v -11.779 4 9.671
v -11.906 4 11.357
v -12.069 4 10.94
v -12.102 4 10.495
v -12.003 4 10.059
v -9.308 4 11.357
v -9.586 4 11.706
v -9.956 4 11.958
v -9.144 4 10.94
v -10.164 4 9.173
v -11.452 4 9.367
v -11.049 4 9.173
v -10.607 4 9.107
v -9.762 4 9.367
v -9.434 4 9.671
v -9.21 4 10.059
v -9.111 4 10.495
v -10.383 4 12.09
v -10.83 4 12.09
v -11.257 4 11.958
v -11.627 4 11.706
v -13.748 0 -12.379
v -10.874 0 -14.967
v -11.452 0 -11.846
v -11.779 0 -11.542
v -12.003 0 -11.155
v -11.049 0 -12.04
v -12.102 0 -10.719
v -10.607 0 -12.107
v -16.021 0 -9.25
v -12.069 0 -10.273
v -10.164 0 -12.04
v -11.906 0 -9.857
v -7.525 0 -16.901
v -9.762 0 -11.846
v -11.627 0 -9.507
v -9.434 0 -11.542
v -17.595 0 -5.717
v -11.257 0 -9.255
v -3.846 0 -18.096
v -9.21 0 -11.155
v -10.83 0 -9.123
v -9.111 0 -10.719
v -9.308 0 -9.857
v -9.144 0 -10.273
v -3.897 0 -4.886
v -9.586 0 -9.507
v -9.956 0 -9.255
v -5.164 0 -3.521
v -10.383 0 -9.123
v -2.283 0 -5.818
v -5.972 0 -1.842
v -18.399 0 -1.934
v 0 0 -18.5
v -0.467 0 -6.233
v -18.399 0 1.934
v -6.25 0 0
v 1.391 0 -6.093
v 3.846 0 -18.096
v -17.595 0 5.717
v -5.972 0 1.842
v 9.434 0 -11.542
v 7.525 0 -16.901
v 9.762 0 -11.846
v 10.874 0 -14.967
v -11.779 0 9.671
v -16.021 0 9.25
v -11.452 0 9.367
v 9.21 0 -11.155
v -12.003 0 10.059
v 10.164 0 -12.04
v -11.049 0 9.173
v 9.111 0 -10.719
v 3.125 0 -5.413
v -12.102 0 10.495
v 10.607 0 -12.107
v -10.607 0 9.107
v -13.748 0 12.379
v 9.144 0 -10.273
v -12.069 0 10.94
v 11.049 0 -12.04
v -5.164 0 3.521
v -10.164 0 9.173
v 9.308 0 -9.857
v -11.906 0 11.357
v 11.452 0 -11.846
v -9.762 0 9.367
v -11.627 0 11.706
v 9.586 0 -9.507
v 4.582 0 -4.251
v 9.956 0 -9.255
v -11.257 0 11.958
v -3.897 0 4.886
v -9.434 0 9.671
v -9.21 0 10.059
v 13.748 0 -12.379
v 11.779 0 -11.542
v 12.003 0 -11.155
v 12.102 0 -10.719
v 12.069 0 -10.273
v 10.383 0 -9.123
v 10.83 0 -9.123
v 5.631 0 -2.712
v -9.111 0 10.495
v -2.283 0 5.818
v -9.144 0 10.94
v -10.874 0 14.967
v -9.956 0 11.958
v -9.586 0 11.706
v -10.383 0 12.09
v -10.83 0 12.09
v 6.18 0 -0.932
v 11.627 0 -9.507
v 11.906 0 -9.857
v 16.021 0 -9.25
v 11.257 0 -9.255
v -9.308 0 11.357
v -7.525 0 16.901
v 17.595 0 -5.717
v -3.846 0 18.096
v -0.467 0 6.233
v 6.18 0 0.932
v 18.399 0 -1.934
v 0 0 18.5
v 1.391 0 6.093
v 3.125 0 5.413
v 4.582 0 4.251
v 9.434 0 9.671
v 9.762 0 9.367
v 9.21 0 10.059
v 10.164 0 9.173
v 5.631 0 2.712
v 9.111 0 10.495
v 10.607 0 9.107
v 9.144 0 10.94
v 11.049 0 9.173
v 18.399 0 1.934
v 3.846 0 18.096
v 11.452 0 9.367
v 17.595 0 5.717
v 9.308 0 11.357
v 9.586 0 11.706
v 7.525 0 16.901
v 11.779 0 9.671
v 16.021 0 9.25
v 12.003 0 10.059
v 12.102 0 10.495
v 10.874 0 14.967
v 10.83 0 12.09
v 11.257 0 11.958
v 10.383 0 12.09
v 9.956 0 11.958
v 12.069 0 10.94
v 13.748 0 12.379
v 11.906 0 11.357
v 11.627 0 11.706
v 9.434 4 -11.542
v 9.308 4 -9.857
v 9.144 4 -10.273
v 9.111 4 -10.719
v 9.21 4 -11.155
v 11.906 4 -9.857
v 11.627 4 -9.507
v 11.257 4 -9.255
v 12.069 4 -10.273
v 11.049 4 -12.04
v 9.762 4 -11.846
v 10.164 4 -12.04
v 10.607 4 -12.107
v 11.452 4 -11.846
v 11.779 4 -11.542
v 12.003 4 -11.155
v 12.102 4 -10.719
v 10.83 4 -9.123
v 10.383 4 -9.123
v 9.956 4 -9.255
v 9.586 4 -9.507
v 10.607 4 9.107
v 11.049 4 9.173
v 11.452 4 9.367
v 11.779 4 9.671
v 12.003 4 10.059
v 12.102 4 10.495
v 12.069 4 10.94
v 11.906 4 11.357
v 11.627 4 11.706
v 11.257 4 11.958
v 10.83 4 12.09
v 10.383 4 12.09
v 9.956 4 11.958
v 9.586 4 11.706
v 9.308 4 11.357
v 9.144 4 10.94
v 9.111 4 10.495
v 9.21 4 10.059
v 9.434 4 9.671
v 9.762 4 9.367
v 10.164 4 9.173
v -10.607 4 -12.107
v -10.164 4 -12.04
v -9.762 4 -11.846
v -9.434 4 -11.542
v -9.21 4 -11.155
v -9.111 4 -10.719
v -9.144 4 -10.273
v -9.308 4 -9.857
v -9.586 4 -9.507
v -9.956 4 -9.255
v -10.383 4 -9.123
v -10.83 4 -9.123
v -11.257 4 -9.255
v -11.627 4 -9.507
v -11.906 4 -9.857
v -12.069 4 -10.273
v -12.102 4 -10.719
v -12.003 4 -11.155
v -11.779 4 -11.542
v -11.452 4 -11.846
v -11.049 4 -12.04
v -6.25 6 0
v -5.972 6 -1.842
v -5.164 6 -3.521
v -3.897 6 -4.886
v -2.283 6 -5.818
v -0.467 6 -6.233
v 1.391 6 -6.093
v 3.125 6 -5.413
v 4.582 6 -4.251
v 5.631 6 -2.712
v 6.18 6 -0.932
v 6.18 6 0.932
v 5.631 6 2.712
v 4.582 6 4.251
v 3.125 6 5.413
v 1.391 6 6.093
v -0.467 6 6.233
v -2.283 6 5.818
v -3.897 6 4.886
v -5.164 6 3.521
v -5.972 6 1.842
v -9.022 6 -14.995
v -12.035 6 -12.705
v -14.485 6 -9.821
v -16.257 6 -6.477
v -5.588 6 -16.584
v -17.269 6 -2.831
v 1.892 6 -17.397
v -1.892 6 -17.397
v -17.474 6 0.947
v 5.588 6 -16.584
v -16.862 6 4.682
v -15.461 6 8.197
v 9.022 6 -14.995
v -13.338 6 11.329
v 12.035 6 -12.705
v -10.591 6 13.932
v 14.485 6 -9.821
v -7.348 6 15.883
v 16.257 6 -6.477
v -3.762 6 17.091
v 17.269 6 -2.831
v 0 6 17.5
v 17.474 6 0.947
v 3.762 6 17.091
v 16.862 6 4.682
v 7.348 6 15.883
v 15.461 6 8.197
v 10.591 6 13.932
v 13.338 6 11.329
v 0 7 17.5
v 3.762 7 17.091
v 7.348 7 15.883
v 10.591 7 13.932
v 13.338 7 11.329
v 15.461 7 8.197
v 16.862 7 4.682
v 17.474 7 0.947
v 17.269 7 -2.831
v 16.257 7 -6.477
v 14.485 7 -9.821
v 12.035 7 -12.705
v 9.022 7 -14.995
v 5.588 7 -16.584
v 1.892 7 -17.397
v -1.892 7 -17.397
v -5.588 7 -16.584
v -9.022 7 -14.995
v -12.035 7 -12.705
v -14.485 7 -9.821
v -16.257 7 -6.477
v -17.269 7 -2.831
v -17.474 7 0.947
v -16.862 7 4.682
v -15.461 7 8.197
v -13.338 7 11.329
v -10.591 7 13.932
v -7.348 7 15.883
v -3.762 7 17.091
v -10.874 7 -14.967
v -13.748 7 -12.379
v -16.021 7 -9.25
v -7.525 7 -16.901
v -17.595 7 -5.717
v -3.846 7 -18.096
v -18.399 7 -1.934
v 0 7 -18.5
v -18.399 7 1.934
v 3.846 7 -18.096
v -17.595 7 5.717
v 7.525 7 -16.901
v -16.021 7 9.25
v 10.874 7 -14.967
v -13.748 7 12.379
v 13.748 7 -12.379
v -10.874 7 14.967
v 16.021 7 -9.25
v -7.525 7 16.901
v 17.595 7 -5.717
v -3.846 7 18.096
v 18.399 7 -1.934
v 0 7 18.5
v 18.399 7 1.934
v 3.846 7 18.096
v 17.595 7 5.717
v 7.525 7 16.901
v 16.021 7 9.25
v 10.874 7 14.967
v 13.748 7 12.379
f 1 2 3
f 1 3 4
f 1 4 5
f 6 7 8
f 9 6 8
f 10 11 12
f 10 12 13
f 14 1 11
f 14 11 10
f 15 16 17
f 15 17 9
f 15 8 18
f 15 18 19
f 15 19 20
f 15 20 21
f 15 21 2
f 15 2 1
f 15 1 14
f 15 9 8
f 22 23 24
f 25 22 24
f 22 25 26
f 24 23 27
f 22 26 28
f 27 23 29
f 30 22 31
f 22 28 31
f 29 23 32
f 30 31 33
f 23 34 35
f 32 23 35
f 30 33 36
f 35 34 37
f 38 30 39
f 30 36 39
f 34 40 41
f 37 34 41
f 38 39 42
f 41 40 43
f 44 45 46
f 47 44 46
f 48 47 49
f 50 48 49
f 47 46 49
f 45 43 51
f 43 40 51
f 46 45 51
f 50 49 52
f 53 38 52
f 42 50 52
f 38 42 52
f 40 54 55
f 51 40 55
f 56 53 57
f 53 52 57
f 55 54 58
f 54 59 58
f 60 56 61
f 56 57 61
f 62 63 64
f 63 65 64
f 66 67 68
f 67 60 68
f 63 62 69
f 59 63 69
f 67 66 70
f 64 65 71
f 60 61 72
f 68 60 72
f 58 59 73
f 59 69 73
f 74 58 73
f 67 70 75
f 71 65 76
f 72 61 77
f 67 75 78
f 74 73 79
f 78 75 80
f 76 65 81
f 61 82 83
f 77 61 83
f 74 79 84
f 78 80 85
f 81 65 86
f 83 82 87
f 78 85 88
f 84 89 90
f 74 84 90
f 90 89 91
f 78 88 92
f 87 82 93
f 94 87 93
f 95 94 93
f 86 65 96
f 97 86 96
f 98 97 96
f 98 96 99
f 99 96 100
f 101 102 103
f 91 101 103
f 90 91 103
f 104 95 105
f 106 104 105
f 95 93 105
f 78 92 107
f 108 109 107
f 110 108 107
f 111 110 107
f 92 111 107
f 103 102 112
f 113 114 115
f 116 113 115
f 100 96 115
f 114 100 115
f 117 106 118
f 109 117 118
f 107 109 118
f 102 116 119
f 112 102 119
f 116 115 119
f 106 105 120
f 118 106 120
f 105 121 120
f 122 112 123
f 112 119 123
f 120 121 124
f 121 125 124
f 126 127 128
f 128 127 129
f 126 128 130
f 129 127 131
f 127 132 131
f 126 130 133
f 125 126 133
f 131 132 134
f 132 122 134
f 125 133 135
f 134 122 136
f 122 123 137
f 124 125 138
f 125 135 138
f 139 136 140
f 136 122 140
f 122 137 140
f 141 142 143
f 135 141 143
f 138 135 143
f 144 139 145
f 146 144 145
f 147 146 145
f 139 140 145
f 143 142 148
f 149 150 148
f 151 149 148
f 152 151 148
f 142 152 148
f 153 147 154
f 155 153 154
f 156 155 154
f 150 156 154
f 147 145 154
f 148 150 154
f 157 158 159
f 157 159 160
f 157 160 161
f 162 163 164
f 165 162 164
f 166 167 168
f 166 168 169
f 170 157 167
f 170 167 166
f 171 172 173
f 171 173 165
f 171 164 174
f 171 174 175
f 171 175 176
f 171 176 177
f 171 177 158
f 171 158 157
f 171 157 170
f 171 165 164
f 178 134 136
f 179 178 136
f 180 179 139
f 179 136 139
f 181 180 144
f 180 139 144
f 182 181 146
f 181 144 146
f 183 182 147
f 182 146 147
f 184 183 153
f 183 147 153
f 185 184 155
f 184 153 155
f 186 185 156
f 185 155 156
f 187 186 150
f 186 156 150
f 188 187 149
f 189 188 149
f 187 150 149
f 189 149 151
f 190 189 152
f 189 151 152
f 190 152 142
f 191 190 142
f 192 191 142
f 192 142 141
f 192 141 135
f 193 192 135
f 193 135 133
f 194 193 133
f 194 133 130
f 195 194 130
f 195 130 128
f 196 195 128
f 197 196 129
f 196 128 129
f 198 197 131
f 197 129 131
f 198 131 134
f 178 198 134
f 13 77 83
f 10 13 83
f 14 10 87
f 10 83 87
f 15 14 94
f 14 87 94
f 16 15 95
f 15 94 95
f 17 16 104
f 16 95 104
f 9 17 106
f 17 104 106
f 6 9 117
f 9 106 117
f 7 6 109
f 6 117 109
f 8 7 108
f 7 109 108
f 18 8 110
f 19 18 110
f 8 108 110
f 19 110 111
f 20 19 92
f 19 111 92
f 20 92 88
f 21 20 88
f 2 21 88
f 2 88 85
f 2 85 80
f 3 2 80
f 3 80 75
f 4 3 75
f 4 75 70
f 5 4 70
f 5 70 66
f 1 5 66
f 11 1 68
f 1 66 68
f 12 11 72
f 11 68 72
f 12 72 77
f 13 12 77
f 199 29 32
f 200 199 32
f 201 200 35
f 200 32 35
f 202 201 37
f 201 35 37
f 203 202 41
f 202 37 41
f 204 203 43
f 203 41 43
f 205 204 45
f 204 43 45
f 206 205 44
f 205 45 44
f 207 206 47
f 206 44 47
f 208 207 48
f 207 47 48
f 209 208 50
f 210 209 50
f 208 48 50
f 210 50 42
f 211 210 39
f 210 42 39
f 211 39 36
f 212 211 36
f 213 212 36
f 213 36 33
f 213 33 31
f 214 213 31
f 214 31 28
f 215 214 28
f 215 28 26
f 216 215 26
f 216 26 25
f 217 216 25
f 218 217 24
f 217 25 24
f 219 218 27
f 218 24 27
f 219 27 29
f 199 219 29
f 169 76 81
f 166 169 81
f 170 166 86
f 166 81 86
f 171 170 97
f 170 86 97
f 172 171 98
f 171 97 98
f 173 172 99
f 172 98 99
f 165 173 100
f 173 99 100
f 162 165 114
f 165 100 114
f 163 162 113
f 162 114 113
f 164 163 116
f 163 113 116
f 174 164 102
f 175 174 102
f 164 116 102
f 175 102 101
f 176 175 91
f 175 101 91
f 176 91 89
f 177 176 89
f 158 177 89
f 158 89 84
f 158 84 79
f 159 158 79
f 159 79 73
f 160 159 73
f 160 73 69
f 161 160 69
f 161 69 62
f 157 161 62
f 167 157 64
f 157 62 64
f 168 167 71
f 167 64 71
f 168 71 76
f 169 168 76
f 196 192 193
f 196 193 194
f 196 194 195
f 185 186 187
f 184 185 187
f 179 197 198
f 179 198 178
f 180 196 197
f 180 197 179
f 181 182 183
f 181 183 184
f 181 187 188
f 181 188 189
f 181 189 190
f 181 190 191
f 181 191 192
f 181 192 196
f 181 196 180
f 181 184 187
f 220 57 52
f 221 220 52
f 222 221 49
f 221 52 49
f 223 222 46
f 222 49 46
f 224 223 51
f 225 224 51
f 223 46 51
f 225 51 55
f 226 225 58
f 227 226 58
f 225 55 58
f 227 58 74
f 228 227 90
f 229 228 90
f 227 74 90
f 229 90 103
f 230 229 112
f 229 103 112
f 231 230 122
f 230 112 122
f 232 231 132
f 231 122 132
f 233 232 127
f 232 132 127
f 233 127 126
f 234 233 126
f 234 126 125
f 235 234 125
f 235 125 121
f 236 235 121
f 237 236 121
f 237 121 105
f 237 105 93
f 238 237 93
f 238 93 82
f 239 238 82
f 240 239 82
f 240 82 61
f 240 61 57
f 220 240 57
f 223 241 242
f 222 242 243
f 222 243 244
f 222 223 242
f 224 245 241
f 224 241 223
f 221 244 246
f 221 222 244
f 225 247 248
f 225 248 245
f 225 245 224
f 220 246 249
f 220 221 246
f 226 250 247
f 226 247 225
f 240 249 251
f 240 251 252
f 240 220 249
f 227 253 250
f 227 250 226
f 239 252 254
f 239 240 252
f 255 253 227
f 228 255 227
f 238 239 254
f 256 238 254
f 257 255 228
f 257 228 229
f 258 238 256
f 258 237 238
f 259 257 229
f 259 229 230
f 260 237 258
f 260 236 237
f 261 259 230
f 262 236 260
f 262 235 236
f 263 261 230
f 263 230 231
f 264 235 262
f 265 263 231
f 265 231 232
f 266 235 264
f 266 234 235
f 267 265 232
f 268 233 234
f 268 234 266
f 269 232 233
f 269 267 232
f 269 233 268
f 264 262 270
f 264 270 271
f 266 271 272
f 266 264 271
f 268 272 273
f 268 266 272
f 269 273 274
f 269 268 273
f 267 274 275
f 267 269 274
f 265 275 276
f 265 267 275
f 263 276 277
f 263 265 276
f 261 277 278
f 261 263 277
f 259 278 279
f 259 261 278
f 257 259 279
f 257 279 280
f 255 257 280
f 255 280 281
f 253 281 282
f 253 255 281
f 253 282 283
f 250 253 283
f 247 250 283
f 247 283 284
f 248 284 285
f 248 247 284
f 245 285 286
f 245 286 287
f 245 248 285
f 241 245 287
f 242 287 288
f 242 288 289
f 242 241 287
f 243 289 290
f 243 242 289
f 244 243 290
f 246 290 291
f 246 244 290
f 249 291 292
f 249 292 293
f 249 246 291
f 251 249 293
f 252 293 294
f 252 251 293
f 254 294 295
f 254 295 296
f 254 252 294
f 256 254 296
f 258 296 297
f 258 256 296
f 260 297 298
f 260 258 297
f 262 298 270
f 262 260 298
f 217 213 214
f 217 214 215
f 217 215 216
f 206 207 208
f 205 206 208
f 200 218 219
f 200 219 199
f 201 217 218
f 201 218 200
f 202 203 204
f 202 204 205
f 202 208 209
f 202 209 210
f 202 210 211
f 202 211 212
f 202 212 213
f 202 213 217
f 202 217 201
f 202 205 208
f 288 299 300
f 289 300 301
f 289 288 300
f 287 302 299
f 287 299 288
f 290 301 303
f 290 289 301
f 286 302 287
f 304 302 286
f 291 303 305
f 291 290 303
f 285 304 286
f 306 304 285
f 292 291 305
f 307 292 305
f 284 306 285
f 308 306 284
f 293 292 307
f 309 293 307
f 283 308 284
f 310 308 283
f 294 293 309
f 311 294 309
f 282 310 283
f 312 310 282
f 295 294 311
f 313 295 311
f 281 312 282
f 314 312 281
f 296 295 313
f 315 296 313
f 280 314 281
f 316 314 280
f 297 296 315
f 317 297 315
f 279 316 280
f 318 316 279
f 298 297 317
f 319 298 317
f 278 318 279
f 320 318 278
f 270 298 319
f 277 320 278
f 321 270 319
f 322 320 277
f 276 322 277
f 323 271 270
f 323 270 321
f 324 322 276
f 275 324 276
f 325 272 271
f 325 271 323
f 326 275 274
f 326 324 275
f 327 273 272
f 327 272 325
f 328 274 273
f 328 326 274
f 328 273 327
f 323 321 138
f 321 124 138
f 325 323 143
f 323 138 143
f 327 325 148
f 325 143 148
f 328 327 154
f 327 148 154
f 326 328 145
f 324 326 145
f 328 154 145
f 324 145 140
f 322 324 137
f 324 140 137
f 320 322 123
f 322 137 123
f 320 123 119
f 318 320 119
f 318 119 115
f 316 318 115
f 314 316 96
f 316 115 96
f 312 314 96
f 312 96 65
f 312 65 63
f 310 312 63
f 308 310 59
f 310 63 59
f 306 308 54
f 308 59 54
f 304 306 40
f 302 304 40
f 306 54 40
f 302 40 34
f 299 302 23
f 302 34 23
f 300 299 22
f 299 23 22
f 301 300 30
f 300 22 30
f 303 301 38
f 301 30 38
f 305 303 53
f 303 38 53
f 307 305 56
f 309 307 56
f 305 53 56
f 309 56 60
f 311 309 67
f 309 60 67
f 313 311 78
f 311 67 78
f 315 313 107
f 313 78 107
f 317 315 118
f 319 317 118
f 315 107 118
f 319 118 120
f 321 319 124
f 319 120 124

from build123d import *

# Parameters (mm, degrees)
SKETCH1_R              = 18.5
BOSS_EXTRUDE1_DEPTH    = 6
SKETCH2_R              = 18.5
SKETCH2_R_2            = 17.5
BOSS_EXTRUDE2_DEPTH    = 1
M14X1_5_TAPPED_HOLE1_D = 12.5
SKETCH5_R              = 1.5
CUT_EXTRUDE1_DEPTH     = 4


with BuildPart() as part:
    # Sketch1 → Boss-Extrude1 (new body)
    with BuildSketch(Plane(origin=(0, 0, 0), x_dir=(1, 0, 0), z_dir=(0, 1, 0))):
        with Locations(Location((0, 0, 0), (0, 0, 270))):
            Circle(SKETCH1_R)
    extrude(amount=BOSS_EXTRUDE1_DEPTH)

    # Sketch2 → Boss-Extrude2 (add)
    with BuildSketch(Plane(origin=(0, 6, 0), x_dir=(1, 0, 0), z_dir=(0, 1, 0))):
        with Locations(Location((0, 0, 0), (0, 0, 270))):
            Circle(SKETCH2_R)
        with Locations(Location((0, 0, 0), (0, 0, 270))):
            Circle(SKETCH2_R_2, mode=Mode.SUBTRACT)
    extrude(amount=BOSS_EXTRUDE2_DEPTH)

    # M14x1.5 Tapped Hole1 (through all)
    with Locations(Plane(origin=(0, 6, 0), x_dir=(1, 0, 0), z_dir=(0, 1, 0))):
        with Locations((0, 0)):
            Hole(M14X1_5_TAPPED_HOLE1_D / 2)

    # Sketch5 → Cut-Extrude1 (cut)
    with BuildSketch(Plane.XZ):
        with Locations(Location((-10.606601718, 10.606601718, 0), (0, 0, 270))):
            Circle(SKETCH5_R)
        with Locations(Location((10.606601718, 10.606601718, 0), (0, 0, 270))):
            Circle(SKETCH5_R)
        with Locations(Location((10.606601718, -10.606601718, 0), (0, 0, 270))):
            Circle(SKETCH5_R)
        with Locations(Location((-10.606601718, -10.606601718, 0), (0, 0, 270))):
            Circle(SKETCH5_R)
    extrude(amount=-CUT_EXTRUDE1_DEPTH, mode=Mode.SUBTRACT)


solid = part.part
